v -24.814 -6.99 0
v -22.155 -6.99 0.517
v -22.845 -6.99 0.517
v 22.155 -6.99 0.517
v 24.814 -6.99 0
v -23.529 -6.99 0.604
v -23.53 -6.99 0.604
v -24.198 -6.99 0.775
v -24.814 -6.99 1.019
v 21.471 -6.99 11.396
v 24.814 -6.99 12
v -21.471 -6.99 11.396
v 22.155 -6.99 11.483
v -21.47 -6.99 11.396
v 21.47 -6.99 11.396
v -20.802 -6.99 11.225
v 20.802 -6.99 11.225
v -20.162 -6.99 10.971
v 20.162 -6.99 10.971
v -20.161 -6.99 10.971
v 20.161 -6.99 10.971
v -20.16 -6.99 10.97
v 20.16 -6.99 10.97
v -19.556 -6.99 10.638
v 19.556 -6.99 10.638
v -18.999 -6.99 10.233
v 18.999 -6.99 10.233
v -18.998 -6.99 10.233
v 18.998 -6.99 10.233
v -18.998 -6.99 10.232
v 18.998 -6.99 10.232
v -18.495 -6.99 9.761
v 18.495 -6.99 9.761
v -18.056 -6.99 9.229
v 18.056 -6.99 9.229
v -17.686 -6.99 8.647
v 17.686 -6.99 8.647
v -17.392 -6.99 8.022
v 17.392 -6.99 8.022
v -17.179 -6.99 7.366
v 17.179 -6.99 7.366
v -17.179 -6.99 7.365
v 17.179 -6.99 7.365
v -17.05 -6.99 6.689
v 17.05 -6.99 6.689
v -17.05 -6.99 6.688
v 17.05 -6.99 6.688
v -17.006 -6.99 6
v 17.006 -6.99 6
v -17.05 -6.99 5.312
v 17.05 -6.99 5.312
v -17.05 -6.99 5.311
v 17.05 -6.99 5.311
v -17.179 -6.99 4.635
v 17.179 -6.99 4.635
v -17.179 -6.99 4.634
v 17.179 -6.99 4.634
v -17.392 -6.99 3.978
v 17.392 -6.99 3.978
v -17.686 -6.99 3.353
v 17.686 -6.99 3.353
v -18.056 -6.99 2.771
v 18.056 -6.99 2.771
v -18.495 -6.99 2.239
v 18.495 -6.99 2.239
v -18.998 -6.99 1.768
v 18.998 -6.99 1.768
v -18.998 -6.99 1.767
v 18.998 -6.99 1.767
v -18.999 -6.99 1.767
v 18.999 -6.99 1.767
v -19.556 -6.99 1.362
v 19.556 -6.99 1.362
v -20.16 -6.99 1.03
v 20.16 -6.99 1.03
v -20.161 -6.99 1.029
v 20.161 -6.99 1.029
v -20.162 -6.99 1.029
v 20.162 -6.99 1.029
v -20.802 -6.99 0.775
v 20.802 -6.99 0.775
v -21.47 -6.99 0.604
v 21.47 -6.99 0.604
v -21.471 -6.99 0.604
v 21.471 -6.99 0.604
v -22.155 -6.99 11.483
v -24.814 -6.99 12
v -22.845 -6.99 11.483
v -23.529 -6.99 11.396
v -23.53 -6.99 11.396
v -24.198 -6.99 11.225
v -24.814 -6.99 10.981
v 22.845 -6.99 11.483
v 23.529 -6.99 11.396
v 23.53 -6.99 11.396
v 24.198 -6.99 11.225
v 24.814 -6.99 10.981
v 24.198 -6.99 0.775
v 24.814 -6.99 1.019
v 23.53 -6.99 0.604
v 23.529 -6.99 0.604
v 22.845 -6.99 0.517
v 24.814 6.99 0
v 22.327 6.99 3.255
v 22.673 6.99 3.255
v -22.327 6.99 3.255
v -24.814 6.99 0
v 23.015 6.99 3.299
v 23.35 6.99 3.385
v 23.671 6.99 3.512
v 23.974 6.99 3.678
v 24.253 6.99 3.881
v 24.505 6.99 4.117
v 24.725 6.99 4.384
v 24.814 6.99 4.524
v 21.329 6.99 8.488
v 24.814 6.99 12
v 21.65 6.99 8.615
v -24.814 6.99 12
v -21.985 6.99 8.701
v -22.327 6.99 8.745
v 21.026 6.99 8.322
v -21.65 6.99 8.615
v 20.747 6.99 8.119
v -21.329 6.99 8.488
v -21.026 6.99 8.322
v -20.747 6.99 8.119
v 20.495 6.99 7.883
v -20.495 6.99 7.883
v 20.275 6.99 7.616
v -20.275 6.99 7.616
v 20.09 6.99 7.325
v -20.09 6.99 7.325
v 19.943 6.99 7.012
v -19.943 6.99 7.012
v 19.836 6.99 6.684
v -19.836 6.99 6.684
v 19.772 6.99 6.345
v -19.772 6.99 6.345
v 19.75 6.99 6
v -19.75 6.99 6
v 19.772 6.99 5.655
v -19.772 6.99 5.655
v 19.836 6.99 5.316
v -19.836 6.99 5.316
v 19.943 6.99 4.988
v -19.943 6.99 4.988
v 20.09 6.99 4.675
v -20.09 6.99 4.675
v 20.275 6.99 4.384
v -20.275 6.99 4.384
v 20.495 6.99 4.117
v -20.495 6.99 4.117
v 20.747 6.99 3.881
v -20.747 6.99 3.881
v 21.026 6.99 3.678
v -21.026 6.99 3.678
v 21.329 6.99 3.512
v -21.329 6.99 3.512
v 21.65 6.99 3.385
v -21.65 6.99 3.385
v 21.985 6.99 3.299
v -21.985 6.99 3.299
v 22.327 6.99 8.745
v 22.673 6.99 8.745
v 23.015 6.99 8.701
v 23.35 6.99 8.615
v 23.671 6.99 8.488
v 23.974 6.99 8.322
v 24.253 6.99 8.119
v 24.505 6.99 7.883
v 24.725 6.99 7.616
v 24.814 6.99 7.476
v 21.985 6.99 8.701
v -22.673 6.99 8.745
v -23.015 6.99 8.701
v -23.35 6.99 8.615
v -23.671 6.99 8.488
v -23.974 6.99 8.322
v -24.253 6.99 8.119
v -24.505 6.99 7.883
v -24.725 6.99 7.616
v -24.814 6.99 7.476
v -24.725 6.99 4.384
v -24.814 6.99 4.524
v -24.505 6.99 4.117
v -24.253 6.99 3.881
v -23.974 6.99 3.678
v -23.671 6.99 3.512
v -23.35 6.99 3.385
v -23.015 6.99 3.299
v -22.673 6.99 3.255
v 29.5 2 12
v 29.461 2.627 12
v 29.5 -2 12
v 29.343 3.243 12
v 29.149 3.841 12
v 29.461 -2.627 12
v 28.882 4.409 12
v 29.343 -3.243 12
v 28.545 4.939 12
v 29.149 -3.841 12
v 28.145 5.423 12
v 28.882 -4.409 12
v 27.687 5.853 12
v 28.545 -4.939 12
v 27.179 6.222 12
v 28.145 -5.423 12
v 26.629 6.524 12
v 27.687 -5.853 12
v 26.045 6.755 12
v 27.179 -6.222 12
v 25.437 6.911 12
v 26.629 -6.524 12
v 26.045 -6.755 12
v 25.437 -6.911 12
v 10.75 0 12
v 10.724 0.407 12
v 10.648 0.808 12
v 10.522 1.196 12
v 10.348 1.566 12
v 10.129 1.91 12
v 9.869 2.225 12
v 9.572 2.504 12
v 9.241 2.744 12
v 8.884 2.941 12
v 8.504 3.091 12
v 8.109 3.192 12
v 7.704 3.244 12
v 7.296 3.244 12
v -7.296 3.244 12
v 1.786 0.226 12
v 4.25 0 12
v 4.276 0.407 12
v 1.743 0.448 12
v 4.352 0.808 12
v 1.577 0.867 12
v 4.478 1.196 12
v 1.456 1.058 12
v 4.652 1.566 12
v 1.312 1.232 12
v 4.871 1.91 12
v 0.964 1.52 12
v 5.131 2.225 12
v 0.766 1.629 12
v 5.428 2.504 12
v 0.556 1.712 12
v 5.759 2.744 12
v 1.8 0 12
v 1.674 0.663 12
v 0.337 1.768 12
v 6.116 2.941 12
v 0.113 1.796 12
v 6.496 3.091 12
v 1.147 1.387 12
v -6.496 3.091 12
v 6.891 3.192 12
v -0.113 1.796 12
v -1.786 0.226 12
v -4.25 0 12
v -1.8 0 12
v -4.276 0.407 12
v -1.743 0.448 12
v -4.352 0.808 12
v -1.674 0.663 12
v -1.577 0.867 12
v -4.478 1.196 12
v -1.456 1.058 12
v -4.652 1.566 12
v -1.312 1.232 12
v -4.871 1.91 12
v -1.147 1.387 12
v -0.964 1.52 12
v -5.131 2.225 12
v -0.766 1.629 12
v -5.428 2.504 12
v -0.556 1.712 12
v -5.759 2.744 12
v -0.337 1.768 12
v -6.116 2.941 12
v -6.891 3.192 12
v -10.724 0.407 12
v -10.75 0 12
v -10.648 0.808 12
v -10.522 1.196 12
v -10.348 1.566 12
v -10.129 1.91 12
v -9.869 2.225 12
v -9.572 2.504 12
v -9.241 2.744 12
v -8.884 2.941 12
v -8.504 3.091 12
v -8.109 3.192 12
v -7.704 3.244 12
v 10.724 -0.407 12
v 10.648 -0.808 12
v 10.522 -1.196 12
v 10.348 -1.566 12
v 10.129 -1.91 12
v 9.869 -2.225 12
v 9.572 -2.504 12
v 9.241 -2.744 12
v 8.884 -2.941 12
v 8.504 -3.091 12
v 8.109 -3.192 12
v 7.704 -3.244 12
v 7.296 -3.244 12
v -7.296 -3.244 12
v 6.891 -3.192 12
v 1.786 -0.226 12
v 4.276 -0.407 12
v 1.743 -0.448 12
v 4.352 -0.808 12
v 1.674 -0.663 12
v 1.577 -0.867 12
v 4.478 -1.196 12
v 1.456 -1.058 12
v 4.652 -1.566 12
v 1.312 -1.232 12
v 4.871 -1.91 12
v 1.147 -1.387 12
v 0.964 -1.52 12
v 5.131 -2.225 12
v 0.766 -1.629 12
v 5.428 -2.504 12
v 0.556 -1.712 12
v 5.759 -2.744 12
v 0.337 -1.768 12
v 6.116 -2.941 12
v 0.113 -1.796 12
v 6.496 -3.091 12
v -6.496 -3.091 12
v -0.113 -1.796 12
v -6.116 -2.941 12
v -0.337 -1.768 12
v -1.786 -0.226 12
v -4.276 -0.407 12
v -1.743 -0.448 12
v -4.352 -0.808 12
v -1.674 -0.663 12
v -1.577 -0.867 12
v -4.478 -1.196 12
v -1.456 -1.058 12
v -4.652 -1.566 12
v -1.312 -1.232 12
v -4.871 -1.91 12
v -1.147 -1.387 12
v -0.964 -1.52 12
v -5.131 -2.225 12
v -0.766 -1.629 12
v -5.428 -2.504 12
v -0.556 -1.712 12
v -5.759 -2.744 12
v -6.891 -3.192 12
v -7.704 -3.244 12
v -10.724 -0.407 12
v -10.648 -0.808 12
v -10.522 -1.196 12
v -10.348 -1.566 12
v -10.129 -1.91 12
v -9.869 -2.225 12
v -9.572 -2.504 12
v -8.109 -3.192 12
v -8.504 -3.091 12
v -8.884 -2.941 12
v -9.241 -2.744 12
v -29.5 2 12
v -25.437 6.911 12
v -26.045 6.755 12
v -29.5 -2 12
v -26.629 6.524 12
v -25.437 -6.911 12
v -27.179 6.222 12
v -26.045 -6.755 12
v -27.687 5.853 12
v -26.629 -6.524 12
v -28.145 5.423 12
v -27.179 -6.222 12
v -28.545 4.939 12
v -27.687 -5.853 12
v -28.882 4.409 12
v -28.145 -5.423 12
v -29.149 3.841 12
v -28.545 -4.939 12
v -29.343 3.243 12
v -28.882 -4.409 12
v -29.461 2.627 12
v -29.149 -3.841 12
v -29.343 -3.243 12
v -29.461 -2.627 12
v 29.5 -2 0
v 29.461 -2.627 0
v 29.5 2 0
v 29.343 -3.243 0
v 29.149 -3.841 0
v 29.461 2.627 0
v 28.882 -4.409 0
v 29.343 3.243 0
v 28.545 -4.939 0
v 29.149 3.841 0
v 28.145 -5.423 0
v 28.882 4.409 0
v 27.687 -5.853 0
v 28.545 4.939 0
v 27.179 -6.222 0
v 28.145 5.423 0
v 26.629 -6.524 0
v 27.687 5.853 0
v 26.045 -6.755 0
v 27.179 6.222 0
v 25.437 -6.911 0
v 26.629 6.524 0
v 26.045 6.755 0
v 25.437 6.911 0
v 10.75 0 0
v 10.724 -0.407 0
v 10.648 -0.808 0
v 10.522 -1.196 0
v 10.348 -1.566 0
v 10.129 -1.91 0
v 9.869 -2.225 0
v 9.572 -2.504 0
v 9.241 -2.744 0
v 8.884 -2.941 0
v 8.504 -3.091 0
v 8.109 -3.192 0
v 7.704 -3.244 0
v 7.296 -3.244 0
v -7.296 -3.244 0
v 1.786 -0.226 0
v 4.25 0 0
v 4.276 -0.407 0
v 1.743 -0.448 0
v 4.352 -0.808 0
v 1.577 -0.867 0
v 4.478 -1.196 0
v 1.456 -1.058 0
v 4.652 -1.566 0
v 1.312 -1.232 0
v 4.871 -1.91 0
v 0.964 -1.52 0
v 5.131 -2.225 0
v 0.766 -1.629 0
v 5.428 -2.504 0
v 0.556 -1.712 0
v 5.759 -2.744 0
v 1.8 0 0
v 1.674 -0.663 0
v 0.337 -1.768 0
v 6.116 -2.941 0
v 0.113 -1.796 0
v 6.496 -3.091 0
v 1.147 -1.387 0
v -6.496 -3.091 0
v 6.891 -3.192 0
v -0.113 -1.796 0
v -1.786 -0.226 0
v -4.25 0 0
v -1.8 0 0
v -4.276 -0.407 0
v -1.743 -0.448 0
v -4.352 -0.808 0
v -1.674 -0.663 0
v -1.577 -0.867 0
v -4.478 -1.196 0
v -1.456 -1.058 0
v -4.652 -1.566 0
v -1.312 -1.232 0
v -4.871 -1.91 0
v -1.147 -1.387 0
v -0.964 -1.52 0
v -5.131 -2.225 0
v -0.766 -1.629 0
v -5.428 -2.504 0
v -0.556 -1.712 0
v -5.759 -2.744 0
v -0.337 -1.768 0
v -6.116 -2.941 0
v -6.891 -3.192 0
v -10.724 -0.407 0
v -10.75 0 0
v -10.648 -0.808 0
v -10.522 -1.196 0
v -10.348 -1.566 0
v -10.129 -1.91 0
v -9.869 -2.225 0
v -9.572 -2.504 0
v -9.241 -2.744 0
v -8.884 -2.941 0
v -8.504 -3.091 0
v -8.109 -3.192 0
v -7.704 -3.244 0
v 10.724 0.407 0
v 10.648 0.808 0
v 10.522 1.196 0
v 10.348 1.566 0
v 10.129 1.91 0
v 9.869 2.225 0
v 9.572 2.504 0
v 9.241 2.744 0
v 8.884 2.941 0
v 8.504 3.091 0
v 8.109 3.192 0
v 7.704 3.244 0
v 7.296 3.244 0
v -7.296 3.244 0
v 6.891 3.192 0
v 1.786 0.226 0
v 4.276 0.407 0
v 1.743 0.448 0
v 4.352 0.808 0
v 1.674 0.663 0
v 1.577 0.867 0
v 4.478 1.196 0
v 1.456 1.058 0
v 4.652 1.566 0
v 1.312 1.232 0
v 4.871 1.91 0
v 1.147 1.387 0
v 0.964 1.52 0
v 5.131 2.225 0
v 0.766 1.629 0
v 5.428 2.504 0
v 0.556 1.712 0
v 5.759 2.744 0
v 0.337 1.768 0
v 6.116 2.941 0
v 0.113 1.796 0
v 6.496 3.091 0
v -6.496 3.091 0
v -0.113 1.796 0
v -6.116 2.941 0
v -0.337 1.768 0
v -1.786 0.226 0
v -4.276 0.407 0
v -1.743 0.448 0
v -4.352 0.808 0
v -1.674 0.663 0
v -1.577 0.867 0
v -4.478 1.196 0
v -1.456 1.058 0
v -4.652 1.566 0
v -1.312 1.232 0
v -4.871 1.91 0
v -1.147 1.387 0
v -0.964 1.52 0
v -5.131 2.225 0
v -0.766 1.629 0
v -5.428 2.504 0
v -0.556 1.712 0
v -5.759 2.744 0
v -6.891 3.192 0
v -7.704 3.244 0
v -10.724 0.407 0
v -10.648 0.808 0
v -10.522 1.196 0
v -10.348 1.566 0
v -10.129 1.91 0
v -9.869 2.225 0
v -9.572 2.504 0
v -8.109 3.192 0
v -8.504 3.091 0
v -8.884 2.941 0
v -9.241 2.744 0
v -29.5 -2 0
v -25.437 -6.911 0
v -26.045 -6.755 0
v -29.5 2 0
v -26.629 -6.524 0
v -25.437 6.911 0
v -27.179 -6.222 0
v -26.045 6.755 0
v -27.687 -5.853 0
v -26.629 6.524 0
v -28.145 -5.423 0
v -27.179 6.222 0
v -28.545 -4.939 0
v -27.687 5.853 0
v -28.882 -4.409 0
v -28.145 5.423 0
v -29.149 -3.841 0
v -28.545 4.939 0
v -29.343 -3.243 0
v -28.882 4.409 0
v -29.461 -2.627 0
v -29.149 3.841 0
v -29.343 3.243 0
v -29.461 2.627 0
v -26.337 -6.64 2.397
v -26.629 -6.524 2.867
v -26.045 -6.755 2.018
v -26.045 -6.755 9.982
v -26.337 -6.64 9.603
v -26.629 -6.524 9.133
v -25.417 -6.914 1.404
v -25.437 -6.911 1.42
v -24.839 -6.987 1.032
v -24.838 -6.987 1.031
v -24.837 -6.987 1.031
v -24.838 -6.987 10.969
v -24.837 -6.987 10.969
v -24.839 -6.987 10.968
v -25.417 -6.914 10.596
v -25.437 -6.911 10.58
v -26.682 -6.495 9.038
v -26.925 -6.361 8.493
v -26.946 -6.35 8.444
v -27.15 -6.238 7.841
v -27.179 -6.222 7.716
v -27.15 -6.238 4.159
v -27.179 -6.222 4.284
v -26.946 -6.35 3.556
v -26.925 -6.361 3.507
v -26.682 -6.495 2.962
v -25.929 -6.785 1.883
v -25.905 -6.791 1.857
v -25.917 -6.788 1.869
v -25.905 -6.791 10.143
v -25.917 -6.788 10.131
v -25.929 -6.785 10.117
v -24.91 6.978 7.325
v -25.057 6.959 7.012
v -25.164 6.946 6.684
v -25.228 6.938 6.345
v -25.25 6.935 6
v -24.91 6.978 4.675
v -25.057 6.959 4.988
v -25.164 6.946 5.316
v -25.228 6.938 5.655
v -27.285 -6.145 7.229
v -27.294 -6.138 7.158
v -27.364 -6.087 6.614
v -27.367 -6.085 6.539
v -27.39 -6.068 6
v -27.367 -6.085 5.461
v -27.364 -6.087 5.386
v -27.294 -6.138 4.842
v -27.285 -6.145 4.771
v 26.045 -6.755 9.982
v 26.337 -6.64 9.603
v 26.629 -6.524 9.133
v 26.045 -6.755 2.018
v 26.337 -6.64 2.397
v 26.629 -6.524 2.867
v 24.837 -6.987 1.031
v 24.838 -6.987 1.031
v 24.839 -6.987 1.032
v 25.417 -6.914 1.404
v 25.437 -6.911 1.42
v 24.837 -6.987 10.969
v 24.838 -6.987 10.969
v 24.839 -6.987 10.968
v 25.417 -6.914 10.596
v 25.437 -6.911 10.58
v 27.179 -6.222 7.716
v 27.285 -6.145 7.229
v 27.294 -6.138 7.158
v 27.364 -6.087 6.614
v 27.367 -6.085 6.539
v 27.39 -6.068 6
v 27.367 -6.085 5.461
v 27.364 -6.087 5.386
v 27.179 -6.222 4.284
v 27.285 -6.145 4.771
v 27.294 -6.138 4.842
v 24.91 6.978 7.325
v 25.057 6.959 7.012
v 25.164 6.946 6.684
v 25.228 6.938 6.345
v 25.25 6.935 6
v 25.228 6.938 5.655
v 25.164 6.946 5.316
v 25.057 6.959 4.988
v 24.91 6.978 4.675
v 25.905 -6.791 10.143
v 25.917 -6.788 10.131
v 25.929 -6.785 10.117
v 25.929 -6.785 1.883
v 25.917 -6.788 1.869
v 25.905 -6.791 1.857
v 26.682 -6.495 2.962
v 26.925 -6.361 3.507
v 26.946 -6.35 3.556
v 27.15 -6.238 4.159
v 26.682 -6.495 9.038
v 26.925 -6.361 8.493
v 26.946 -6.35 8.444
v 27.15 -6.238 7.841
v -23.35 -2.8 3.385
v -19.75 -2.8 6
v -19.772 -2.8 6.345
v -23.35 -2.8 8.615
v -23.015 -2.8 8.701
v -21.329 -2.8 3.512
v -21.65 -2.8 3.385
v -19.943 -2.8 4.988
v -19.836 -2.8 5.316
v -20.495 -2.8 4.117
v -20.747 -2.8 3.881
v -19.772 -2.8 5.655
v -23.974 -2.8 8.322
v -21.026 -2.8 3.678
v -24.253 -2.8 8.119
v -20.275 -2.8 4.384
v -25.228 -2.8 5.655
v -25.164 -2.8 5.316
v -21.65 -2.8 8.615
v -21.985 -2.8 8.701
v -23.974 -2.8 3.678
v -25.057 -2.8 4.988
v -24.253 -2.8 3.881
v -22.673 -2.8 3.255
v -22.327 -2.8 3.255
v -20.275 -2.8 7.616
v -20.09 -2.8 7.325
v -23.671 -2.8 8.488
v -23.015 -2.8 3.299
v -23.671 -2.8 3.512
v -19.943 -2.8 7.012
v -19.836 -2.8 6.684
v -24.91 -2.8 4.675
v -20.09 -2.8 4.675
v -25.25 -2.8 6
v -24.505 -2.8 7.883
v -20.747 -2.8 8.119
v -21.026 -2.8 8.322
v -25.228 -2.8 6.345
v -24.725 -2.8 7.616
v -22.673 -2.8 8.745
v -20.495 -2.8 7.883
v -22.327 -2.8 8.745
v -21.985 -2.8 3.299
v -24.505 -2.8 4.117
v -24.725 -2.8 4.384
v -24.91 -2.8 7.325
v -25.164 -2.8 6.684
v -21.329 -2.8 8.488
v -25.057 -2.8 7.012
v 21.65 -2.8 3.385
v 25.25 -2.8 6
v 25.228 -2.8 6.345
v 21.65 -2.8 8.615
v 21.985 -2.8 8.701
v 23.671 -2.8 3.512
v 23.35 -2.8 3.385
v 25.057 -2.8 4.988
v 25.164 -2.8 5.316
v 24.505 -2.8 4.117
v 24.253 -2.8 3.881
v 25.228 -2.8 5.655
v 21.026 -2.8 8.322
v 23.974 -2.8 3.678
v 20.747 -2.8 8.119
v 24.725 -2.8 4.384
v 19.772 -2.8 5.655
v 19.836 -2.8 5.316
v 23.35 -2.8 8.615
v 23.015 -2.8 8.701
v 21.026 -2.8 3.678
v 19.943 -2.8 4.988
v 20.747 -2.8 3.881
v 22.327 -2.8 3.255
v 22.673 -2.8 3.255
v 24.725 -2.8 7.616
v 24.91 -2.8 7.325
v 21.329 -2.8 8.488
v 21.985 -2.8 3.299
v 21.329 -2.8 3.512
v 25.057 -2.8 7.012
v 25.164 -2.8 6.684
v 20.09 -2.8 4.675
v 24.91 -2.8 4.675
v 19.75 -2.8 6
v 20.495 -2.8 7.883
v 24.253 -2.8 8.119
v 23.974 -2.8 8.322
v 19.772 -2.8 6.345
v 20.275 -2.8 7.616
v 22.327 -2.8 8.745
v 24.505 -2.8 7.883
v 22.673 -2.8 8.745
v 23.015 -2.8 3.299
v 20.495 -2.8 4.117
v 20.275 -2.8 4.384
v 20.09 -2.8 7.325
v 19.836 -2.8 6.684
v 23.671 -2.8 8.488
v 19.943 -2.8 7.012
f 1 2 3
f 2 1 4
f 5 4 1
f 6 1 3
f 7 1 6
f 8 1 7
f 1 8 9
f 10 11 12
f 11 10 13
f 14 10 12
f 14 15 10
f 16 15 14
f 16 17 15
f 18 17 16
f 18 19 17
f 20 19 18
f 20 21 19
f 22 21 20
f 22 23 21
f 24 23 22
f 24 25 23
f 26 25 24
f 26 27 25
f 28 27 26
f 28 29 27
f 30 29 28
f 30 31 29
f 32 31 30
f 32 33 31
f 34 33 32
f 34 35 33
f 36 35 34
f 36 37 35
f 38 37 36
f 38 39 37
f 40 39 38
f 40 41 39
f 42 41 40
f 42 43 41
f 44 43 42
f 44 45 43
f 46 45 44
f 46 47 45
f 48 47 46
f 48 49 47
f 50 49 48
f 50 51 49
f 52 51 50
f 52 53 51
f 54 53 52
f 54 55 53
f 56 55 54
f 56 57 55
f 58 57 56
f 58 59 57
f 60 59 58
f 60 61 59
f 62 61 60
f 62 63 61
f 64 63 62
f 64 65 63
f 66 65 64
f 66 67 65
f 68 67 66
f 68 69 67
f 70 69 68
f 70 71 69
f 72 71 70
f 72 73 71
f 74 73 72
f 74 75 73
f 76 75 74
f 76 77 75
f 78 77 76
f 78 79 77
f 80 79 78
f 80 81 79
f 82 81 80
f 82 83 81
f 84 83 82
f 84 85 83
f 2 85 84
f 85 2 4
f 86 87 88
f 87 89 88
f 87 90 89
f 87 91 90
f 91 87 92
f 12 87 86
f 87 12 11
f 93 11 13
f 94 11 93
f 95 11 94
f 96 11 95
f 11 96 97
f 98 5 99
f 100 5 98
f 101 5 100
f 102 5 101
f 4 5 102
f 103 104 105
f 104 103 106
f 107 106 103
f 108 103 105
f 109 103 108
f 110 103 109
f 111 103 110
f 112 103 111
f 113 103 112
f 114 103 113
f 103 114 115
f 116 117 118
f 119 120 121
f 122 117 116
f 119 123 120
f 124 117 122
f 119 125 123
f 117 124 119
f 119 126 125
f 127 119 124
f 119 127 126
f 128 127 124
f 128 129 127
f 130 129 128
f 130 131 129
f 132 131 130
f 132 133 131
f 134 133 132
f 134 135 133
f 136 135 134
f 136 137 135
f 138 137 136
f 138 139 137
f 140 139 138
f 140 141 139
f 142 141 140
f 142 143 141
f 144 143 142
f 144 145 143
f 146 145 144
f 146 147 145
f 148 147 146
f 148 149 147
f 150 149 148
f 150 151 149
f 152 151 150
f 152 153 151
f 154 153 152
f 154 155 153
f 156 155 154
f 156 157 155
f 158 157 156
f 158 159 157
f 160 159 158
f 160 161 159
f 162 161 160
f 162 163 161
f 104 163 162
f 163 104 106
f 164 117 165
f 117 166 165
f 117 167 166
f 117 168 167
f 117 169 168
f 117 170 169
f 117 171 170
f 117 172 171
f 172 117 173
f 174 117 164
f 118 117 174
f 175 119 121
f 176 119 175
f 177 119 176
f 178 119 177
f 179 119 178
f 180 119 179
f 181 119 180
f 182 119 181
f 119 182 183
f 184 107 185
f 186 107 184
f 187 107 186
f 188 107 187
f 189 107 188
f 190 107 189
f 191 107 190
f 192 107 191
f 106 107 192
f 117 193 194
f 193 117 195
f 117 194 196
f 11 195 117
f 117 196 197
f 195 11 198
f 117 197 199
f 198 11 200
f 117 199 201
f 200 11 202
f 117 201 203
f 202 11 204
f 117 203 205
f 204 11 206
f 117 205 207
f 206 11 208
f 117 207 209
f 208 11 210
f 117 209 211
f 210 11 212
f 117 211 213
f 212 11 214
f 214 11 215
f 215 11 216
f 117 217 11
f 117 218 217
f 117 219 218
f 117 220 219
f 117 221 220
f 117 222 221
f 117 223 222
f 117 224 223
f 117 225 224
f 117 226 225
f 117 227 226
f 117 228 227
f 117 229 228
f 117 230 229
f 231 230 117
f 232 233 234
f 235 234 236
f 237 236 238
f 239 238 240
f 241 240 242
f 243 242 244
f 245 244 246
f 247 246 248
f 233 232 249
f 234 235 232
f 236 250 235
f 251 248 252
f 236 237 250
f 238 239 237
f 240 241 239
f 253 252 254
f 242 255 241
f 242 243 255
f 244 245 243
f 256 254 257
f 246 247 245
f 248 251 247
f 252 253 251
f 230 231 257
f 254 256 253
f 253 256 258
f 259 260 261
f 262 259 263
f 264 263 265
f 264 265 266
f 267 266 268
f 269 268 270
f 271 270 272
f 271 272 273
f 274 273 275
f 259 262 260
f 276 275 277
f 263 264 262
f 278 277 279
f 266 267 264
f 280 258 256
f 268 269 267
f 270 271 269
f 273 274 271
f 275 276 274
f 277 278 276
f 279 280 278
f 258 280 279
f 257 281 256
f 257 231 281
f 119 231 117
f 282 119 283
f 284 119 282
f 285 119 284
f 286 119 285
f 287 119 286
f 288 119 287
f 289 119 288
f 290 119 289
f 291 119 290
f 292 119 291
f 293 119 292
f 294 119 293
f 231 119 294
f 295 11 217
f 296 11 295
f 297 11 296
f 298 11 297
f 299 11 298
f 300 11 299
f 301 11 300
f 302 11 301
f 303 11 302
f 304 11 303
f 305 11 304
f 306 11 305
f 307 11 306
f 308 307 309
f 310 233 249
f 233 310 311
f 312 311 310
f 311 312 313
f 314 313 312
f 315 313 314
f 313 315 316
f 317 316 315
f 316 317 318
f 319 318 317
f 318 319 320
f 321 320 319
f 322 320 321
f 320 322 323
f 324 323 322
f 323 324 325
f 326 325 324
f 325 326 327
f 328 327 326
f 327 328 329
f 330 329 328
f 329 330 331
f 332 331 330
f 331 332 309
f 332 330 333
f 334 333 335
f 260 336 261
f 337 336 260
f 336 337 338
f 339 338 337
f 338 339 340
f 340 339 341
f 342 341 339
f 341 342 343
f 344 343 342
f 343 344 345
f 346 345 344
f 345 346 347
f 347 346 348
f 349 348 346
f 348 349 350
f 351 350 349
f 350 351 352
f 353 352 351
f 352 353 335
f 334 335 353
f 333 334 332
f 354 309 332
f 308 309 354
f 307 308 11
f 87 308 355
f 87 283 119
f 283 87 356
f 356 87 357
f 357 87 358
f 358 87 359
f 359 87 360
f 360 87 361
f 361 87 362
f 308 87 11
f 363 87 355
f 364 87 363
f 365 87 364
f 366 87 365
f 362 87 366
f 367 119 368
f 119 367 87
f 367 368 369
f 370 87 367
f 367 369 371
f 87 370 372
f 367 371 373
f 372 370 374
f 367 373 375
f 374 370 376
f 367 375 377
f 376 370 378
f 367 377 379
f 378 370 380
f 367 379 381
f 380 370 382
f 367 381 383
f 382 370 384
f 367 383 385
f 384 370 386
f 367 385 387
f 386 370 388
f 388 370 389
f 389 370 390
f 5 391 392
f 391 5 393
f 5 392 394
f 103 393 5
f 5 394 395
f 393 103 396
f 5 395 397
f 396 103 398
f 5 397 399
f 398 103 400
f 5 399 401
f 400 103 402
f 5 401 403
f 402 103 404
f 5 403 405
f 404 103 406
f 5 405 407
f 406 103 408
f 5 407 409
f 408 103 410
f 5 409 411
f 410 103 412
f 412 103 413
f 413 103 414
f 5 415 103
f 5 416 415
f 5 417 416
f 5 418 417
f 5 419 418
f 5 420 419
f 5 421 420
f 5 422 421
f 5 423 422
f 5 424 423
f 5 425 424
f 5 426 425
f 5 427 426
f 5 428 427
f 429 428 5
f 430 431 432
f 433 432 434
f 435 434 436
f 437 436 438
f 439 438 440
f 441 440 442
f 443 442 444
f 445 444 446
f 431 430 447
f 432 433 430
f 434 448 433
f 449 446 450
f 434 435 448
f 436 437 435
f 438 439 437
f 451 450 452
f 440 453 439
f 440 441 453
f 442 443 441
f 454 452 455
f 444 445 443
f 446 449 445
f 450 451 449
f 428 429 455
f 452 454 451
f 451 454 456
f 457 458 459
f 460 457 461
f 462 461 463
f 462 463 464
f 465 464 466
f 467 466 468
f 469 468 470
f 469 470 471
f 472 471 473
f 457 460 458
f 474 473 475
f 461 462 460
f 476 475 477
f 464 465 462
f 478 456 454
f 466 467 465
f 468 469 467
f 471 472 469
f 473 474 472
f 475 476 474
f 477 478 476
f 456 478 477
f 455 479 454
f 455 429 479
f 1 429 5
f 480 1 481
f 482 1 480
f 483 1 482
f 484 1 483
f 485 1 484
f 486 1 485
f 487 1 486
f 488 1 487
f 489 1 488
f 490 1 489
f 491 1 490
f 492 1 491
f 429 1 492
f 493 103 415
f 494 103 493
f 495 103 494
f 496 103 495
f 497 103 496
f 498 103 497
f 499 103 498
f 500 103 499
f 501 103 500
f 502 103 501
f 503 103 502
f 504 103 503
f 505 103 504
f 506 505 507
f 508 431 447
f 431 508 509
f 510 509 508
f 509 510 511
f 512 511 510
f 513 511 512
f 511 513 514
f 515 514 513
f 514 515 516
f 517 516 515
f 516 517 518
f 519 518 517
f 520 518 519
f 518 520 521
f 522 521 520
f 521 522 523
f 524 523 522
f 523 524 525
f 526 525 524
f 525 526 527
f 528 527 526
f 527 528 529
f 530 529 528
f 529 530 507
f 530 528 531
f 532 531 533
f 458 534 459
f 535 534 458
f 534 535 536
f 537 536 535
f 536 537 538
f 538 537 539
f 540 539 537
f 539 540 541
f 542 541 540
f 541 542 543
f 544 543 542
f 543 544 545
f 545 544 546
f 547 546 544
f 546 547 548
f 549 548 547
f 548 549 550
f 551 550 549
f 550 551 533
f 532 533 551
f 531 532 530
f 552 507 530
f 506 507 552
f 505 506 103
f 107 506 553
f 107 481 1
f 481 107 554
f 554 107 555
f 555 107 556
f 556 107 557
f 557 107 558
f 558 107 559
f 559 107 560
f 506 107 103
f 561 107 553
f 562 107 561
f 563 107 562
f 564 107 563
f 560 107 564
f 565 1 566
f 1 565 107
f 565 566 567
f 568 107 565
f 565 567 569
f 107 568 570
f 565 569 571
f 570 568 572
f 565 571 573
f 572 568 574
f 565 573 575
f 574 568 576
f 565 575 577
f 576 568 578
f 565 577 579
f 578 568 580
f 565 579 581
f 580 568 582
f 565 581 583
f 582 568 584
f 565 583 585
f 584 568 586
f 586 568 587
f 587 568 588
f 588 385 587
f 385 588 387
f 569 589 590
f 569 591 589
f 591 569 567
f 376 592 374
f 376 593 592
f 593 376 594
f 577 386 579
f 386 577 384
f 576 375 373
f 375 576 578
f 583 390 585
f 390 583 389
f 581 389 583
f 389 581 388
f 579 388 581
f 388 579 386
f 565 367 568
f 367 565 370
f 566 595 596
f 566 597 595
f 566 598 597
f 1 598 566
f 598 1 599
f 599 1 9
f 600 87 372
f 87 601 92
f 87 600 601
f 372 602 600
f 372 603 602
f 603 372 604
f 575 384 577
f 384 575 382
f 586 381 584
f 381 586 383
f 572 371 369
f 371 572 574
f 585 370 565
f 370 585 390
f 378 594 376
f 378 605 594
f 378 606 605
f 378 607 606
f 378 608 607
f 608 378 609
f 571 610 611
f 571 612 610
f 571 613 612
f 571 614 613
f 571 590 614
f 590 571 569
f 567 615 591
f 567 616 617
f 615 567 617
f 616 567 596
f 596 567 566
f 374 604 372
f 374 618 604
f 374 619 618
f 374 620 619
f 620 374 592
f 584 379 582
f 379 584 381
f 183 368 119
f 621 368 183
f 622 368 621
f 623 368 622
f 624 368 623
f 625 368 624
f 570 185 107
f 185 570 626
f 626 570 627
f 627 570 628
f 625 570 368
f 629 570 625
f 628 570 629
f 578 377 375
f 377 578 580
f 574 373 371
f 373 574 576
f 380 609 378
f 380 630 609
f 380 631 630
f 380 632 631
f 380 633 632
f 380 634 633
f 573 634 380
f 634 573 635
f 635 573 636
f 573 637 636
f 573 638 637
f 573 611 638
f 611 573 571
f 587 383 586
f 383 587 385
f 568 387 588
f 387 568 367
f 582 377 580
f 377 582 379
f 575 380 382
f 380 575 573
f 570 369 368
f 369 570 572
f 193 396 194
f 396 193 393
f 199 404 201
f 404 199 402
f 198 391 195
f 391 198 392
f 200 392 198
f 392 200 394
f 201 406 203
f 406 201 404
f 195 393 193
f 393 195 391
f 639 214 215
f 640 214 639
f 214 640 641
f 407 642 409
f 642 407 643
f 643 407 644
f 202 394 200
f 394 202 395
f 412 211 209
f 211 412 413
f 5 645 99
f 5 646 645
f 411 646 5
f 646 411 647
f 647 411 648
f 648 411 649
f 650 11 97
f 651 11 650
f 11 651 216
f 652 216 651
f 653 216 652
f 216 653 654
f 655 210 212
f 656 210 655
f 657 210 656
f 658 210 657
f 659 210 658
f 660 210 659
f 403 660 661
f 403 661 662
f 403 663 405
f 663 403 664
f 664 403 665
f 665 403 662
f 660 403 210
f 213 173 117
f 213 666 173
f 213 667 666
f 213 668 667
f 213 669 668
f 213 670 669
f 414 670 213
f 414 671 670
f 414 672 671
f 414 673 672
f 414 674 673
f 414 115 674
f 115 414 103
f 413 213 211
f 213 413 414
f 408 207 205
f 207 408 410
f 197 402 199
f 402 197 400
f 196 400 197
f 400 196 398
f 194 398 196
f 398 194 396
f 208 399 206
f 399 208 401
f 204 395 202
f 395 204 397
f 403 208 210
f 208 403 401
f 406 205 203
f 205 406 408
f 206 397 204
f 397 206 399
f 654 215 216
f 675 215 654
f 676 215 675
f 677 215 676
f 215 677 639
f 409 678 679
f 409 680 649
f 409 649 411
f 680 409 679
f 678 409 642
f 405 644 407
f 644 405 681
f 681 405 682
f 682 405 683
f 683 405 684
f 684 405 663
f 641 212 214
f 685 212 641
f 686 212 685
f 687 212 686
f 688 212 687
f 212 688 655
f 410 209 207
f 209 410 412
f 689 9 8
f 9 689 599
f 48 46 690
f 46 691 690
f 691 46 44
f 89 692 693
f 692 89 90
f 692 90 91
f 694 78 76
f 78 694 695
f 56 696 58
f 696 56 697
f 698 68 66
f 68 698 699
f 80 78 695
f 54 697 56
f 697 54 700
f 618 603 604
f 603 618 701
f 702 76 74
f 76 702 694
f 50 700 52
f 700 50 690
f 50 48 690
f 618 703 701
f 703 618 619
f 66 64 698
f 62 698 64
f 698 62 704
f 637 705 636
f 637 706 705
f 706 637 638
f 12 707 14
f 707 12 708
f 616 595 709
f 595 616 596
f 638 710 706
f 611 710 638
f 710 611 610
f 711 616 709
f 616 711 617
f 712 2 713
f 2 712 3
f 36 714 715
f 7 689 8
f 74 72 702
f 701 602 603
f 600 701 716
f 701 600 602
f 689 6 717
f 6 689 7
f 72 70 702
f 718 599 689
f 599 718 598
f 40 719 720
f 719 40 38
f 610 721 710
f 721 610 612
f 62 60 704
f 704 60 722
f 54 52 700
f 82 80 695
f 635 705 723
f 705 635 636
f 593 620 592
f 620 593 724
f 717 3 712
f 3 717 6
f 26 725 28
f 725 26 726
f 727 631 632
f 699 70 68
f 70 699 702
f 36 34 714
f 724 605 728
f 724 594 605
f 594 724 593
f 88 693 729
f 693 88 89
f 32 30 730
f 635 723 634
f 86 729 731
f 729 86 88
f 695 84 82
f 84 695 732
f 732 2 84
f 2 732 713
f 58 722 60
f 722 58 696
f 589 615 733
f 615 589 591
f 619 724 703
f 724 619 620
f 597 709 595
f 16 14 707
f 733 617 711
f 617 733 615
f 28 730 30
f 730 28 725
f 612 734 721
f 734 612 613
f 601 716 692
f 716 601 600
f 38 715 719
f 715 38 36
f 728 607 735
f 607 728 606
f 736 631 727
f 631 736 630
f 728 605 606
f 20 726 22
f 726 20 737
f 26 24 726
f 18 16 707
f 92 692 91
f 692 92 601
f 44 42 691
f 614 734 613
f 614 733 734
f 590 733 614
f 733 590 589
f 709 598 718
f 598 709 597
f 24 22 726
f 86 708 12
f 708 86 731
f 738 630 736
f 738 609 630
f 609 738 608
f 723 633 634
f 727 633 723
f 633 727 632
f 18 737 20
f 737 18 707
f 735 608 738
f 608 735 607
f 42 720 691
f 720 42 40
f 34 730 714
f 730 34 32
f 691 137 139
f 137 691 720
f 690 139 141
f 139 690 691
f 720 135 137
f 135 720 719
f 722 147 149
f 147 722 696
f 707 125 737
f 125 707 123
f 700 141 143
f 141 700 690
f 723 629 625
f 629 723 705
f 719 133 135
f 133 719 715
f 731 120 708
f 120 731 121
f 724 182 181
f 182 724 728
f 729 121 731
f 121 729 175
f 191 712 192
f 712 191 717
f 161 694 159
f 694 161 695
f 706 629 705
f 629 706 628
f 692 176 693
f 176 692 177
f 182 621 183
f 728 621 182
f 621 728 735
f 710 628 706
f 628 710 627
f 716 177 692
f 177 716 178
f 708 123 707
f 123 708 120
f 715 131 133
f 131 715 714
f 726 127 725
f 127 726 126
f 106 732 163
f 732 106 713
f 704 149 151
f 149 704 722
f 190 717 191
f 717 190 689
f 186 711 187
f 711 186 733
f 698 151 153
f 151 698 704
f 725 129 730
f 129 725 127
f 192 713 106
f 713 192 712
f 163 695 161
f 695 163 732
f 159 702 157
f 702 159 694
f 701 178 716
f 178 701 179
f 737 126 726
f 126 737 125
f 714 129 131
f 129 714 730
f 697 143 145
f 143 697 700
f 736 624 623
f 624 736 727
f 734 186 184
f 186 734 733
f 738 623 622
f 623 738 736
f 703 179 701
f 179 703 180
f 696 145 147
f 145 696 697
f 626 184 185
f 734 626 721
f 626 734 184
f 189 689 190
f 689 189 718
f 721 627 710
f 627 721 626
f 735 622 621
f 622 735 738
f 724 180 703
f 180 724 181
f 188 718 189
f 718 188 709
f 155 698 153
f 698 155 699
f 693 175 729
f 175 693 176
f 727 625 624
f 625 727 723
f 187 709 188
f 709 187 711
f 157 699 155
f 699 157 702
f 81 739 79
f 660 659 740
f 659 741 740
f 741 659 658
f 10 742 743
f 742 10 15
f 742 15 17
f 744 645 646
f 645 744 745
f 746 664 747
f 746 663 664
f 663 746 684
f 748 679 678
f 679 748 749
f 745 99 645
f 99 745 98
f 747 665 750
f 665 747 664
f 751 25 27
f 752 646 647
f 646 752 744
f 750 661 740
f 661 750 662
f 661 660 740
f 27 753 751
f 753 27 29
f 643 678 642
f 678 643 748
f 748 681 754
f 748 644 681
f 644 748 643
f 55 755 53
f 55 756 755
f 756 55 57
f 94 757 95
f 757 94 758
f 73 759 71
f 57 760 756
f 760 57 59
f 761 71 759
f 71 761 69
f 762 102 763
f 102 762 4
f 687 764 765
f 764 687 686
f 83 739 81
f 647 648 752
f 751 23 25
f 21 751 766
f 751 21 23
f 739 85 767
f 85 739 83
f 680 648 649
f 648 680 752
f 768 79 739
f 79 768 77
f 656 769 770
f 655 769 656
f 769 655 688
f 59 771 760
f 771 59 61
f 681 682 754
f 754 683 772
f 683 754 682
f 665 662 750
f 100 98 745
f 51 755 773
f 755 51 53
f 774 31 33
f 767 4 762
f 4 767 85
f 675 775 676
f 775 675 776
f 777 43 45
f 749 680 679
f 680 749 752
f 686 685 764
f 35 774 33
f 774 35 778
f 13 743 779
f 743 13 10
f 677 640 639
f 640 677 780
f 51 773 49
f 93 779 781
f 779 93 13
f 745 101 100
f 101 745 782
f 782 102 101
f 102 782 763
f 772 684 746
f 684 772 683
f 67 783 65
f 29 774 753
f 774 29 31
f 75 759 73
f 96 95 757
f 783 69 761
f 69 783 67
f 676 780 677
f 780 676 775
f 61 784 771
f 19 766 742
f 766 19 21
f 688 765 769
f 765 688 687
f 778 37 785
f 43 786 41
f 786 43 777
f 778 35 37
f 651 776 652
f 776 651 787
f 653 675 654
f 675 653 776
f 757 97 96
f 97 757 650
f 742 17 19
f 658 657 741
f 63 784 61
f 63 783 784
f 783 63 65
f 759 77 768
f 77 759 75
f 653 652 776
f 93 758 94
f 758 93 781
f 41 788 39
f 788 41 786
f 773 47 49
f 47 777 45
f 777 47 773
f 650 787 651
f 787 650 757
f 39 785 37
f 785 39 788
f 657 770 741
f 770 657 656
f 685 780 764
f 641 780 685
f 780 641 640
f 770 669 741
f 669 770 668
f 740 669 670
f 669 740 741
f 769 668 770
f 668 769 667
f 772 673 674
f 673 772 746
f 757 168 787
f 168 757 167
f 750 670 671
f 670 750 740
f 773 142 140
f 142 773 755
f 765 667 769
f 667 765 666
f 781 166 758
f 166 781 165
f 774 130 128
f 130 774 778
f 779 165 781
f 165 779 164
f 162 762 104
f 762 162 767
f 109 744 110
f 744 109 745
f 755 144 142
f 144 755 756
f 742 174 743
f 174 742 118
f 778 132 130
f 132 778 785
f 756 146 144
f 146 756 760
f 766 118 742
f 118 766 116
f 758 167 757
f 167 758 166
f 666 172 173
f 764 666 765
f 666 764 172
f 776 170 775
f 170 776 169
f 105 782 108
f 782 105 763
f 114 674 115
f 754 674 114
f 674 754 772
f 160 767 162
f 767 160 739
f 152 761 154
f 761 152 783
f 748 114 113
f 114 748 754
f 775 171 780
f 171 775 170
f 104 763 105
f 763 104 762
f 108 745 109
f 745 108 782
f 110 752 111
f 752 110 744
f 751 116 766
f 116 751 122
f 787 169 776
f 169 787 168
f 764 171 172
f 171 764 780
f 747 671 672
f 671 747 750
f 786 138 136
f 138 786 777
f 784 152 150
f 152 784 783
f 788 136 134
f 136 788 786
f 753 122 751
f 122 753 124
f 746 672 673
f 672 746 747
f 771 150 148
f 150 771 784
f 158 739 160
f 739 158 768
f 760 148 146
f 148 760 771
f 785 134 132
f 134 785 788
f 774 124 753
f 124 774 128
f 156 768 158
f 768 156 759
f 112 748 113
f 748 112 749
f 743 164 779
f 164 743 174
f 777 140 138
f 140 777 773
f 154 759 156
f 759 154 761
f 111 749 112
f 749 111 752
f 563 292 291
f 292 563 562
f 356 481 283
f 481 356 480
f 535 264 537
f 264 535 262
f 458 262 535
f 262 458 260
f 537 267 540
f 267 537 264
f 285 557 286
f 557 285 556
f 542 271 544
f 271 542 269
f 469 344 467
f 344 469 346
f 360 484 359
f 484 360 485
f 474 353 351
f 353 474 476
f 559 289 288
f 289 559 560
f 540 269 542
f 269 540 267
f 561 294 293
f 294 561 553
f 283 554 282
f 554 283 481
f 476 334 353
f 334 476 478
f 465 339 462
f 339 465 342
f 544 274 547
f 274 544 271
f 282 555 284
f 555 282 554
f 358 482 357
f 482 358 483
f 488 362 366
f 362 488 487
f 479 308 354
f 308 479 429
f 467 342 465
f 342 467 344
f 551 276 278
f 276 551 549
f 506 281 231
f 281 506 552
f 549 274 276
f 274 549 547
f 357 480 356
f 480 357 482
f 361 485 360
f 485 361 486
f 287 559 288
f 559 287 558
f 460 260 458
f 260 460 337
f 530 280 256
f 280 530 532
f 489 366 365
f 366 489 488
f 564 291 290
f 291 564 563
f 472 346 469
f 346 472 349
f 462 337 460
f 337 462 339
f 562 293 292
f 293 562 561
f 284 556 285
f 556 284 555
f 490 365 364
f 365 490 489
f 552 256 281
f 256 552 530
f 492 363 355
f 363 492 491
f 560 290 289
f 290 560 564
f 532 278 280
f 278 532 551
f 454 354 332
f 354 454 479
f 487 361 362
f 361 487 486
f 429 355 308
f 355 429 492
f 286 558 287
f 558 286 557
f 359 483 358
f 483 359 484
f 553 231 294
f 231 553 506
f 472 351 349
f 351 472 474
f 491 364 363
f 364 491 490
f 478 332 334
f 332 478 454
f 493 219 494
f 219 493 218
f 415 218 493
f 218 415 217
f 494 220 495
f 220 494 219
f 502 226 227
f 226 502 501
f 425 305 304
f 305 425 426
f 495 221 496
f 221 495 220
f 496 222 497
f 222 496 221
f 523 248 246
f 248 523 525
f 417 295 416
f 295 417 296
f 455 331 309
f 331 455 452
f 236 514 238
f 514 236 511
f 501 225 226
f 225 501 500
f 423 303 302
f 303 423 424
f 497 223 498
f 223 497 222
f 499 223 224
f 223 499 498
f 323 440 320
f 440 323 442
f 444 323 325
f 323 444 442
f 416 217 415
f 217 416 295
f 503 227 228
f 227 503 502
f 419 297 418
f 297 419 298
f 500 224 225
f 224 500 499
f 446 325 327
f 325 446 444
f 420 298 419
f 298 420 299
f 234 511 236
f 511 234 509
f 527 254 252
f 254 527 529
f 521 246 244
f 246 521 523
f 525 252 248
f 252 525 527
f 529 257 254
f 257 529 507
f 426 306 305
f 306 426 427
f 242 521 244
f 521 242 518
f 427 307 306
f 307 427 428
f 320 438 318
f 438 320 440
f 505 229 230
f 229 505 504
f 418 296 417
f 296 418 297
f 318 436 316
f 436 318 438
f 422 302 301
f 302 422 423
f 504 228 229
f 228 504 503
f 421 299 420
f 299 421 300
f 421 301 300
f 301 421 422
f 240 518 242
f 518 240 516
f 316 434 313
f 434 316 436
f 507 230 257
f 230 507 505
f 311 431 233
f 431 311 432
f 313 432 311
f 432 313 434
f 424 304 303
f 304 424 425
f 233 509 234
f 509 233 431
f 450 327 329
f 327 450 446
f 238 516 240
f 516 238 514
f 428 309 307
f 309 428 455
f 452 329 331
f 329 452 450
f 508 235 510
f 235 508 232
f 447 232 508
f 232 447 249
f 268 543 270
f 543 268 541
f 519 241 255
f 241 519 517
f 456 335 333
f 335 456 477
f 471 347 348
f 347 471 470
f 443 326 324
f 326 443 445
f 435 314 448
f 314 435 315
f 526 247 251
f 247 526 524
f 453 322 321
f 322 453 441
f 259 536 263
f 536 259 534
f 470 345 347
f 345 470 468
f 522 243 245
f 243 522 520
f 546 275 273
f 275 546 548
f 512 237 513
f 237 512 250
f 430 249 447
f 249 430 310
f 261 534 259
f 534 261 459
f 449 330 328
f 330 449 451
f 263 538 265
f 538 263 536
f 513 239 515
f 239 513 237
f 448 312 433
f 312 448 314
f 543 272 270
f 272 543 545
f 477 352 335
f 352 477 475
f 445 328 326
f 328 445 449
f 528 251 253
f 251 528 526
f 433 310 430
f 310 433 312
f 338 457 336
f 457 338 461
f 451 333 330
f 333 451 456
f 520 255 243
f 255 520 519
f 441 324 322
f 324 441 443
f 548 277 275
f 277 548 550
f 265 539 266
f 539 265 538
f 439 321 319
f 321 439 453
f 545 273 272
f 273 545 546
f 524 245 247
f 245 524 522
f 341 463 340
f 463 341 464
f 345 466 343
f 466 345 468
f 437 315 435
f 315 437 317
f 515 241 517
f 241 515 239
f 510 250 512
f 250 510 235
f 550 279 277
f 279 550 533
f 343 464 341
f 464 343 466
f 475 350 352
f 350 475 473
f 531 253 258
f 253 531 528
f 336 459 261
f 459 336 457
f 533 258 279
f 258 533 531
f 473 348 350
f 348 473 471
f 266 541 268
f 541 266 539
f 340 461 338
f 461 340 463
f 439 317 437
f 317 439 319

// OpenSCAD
$fn = 50;


difference() {
	union() {
		hull() {
			translate(v = [-9.5000000000, 2.0000000000, 0]) {
				cylinder(h = 12, r = 5);
			}
			translate(v = [9.5000000000, 2.0000000000, 0]) {
				cylinder(h = 12, r = 5);
			}
			translate(v = [-9.5000000000, -2.0000000000, 0]) {
				cylinder(h = 12, r = 5);
			}
			translate(v = [9.5000000000, -2.0000000000, 0]) {
				cylinder(h = 12, r = 5);
			}
		}
		translate(v = [-15.0000000000, 0.0000000000, 0]) {
			hull() {
				translate(v = [-9.5000000000, 2.0000000000, 0]) {
					cylinder(h = 12, r = 5);
				}
				translate(v = [9.5000000000, 2.0000000000, 0]) {
					cylinder(h = 12, r = 5);
				}
				translate(v = [-9.5000000000, -2.0000000000, 0]) {
					cylinder(h = 12, r = 5);
				}
				translate(v = [9.5000000000, -2.0000000000, 0]) {
					cylinder(h = 12, r = 5);
				}
			}
		}
		translate(v = [15.0000000000, 0.0000000000, 0]) {
			hull() {
				translate(v = [-9.5000000000, 2.0000000000, 0]) {
					cylinder(h = 12, r = 5);
				}
				translate(v = [9.5000000000, 2.0000000000, 0]) {
					cylinder(h = 12, r = 5);
				}
				translate(v = [-9.5000000000, -2.0000000000, 0]) {
					cylinder(h = 12, r = 5);
				}
				translate(v = [9.5000000000, -2.0000000000, 0]) {
					cylinder(h = 12, r = 5);
				}
			}
		}
	}
	union() {
		translate(v = [-22.5000000000, -7.0000000000, 6.0000000000]) {
			rotate(a = [90, 0, 0]) {
				difference() {
					union() {
						#translate(v = [0, 0, -14.0000000000]) {
							cylinder(h = 14, r = 2.2500000000);
						}
						#translate(v = [0, 0, -4.2000000000]) {
							cylinder(h = 4.2000000000, r1 = 2.7500000000, r2 = 5.5000000000);
						}
						#translate(v = [0, 0, -14.0000000000]) {
							cylinder(h = 14, r = 2.7500000000);
						}
						#translate(v = [0, 0, -14.0000000000]) {
							cylinder(h = 14, r = 2.2500000000);
						}
					}
					union();
				}
			}
		}
		translate(v = [22.5000000000, -7.0000000000, 6.0000000000]) {
			rotate(a = [90, 0, 0]) {
				difference() {
					union() {
						#translate(v = [0, 0, -14.0000000000]) {
							cylinder(h = 14, r = 2.2500000000);
						}
						#translate(v = [0, 0, -4.2000000000]) {
							cylinder(h = 4.2000000000, r1 = 2.7500000000, r2 = 5.5000000000);
						}
						#translate(v = [0, 0, -14.0000000000]) {
							cylinder(h = 14, r = 2.7500000000);
						}
						#translate(v = [0, 0, -14.0000000000]) {
							cylinder(h = 14, r = 2.2500000000);
						}
					}
					union();
				}
			}
		}
		translate(v = [-7.5000000000, 0.0000000000, 0]) {
			translate(v = [0, 0, -100]) {
				cylinder(h = 200, r = 3.2500000000);
			}
		}
		translate(v = [7.5000000000, 0.0000000000, 0]) {
			translate(v = [0, 0, -100]) {
				cylinder(h = 200, r = 3.2500000000);
			}
		}
		translate(v = [-7.5000000000, 0.0000000000, 0]) {
			translate(v = [0, 0, -100]) {
				cylinder(h = 200, r = 1.8000000000);
			}
		}
		translate(v = [0, 0, -100]) {
			cylinder(h = 200, r = 1.8000000000);
		}
		translate(v = [7.5000000000, 0.0000000000, 0]) {
			translate(v = [0, 0, -100]) {
				cylinder(h = 200, r = 1.8000000000);
			}
		}
	}
}
